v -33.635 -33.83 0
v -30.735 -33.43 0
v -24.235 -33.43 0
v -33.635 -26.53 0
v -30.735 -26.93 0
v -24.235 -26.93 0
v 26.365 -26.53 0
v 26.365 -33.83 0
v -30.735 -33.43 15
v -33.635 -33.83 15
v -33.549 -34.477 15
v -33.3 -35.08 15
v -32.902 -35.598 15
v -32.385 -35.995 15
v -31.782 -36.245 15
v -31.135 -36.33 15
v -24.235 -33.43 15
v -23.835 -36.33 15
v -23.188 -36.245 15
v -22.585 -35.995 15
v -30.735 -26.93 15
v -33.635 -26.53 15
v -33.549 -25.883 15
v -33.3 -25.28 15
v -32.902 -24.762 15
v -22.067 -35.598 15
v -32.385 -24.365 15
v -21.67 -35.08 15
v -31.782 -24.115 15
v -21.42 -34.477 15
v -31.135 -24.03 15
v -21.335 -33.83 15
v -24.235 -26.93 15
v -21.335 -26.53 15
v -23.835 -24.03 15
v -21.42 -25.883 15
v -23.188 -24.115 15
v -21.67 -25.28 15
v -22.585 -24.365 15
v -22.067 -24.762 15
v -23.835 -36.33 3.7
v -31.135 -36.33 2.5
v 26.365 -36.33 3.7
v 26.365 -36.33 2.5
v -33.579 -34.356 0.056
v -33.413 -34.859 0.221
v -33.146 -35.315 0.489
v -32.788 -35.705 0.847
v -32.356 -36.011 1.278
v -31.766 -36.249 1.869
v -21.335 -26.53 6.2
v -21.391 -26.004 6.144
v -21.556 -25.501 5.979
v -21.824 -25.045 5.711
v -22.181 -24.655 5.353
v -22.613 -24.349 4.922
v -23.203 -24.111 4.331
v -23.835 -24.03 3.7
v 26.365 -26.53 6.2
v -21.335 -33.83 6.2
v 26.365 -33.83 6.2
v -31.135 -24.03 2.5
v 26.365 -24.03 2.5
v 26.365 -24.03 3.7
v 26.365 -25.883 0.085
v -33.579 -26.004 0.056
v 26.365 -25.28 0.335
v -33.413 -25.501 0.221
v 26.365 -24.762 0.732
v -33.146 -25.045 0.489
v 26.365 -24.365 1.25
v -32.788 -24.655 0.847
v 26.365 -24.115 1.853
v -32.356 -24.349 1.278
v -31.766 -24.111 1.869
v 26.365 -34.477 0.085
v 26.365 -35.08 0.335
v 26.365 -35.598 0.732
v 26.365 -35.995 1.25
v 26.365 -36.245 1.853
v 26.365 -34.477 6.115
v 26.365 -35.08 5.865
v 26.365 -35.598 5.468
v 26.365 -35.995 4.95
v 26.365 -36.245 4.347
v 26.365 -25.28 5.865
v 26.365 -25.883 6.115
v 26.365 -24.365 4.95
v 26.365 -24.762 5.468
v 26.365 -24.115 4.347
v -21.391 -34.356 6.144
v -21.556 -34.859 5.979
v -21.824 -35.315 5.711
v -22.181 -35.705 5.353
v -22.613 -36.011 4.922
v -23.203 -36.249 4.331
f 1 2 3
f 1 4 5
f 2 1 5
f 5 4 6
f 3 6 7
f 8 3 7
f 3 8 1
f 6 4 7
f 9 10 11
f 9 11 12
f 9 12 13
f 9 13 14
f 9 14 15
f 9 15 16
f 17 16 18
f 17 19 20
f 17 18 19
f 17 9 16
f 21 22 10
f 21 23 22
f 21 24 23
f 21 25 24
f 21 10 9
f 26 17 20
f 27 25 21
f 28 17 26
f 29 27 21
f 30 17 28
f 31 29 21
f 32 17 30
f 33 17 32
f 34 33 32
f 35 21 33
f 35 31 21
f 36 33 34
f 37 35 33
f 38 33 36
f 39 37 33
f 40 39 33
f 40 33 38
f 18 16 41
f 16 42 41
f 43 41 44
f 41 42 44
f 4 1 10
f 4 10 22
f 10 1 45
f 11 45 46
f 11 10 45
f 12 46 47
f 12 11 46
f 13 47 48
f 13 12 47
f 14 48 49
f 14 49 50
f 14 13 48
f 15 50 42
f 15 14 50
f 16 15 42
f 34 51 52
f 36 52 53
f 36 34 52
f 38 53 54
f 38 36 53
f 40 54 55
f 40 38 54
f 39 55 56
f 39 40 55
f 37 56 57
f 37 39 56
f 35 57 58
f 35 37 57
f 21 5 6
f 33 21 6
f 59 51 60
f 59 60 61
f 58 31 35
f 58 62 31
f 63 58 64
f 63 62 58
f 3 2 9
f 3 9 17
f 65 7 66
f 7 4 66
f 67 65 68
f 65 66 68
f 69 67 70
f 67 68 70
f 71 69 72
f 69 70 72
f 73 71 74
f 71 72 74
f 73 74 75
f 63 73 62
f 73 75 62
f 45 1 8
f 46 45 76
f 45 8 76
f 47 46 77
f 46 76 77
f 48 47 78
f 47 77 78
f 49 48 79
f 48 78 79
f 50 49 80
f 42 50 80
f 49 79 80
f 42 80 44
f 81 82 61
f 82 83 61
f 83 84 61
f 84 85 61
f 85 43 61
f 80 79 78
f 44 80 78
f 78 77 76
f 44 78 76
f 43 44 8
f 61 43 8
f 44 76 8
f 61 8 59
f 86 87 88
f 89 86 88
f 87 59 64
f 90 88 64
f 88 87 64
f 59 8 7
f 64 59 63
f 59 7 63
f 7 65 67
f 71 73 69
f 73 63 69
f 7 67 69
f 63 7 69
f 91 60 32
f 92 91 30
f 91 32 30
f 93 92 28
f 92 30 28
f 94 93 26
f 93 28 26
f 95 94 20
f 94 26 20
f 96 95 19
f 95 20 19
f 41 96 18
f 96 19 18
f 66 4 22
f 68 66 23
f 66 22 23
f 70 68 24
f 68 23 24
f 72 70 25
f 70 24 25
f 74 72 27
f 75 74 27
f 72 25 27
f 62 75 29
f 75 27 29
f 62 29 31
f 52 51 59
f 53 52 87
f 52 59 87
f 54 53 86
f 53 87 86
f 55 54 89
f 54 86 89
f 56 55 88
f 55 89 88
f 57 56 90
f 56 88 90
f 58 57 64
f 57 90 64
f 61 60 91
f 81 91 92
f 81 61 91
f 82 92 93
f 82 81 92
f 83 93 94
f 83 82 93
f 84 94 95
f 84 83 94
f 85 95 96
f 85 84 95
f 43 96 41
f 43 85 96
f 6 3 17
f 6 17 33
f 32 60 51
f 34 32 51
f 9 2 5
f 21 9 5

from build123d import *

# Parameters (mm, degrees)
F0_W     = 47.7
F0_H     = 12.3
F1_DEPTH = 6.2
F0_W_2   = 12.3
F0_W_3   = 6.5
F0_H_2   = 6.5
F2_DEPTH = 15
F3_R     = 2.5


with BuildPart() as f1:
    # F0 (on Top) → F1 (new body)
    with BuildSketch(Plane.XY):
        with Locations((2.515334, -30.180186)):
            Rectangle(F0_W, F0_H)
    extrude(amount=F1_DEPTH)

    # F0 (on Top) → F2 (join)
    with BuildSketch(Plane.XY):
        with Locations((-27.484666, -30.180186)):
            Rectangle(F0_W_2, F0_H)
        with Locations((-27.484666, -30.180186)):
            Rectangle(F0_W_3, F0_H_2, mode=Mode.SUBTRACT)
    extrude(amount=F2_DEPTH)

    # F3
    f3_edges = [f1.edges().sort_by_distance(p)[0] for p in [
        (2.515334, -36.330186, 6.2),
        (2.515334, -24.030186, 6.2),
        (-3.634666, -24.030186, 0),
        (-3.634666, -36.330186, 0),
        (-33.634666, -36.330186, 7.5),
        (-21.334666, -36.330186, 10.6),
        (-21.334666, -24.030186, 10.6),
        (-33.634666, -24.030186, 7.5),
    ]]
    fillet(f3_edges, radius=F3_R)


solid = f1.part
